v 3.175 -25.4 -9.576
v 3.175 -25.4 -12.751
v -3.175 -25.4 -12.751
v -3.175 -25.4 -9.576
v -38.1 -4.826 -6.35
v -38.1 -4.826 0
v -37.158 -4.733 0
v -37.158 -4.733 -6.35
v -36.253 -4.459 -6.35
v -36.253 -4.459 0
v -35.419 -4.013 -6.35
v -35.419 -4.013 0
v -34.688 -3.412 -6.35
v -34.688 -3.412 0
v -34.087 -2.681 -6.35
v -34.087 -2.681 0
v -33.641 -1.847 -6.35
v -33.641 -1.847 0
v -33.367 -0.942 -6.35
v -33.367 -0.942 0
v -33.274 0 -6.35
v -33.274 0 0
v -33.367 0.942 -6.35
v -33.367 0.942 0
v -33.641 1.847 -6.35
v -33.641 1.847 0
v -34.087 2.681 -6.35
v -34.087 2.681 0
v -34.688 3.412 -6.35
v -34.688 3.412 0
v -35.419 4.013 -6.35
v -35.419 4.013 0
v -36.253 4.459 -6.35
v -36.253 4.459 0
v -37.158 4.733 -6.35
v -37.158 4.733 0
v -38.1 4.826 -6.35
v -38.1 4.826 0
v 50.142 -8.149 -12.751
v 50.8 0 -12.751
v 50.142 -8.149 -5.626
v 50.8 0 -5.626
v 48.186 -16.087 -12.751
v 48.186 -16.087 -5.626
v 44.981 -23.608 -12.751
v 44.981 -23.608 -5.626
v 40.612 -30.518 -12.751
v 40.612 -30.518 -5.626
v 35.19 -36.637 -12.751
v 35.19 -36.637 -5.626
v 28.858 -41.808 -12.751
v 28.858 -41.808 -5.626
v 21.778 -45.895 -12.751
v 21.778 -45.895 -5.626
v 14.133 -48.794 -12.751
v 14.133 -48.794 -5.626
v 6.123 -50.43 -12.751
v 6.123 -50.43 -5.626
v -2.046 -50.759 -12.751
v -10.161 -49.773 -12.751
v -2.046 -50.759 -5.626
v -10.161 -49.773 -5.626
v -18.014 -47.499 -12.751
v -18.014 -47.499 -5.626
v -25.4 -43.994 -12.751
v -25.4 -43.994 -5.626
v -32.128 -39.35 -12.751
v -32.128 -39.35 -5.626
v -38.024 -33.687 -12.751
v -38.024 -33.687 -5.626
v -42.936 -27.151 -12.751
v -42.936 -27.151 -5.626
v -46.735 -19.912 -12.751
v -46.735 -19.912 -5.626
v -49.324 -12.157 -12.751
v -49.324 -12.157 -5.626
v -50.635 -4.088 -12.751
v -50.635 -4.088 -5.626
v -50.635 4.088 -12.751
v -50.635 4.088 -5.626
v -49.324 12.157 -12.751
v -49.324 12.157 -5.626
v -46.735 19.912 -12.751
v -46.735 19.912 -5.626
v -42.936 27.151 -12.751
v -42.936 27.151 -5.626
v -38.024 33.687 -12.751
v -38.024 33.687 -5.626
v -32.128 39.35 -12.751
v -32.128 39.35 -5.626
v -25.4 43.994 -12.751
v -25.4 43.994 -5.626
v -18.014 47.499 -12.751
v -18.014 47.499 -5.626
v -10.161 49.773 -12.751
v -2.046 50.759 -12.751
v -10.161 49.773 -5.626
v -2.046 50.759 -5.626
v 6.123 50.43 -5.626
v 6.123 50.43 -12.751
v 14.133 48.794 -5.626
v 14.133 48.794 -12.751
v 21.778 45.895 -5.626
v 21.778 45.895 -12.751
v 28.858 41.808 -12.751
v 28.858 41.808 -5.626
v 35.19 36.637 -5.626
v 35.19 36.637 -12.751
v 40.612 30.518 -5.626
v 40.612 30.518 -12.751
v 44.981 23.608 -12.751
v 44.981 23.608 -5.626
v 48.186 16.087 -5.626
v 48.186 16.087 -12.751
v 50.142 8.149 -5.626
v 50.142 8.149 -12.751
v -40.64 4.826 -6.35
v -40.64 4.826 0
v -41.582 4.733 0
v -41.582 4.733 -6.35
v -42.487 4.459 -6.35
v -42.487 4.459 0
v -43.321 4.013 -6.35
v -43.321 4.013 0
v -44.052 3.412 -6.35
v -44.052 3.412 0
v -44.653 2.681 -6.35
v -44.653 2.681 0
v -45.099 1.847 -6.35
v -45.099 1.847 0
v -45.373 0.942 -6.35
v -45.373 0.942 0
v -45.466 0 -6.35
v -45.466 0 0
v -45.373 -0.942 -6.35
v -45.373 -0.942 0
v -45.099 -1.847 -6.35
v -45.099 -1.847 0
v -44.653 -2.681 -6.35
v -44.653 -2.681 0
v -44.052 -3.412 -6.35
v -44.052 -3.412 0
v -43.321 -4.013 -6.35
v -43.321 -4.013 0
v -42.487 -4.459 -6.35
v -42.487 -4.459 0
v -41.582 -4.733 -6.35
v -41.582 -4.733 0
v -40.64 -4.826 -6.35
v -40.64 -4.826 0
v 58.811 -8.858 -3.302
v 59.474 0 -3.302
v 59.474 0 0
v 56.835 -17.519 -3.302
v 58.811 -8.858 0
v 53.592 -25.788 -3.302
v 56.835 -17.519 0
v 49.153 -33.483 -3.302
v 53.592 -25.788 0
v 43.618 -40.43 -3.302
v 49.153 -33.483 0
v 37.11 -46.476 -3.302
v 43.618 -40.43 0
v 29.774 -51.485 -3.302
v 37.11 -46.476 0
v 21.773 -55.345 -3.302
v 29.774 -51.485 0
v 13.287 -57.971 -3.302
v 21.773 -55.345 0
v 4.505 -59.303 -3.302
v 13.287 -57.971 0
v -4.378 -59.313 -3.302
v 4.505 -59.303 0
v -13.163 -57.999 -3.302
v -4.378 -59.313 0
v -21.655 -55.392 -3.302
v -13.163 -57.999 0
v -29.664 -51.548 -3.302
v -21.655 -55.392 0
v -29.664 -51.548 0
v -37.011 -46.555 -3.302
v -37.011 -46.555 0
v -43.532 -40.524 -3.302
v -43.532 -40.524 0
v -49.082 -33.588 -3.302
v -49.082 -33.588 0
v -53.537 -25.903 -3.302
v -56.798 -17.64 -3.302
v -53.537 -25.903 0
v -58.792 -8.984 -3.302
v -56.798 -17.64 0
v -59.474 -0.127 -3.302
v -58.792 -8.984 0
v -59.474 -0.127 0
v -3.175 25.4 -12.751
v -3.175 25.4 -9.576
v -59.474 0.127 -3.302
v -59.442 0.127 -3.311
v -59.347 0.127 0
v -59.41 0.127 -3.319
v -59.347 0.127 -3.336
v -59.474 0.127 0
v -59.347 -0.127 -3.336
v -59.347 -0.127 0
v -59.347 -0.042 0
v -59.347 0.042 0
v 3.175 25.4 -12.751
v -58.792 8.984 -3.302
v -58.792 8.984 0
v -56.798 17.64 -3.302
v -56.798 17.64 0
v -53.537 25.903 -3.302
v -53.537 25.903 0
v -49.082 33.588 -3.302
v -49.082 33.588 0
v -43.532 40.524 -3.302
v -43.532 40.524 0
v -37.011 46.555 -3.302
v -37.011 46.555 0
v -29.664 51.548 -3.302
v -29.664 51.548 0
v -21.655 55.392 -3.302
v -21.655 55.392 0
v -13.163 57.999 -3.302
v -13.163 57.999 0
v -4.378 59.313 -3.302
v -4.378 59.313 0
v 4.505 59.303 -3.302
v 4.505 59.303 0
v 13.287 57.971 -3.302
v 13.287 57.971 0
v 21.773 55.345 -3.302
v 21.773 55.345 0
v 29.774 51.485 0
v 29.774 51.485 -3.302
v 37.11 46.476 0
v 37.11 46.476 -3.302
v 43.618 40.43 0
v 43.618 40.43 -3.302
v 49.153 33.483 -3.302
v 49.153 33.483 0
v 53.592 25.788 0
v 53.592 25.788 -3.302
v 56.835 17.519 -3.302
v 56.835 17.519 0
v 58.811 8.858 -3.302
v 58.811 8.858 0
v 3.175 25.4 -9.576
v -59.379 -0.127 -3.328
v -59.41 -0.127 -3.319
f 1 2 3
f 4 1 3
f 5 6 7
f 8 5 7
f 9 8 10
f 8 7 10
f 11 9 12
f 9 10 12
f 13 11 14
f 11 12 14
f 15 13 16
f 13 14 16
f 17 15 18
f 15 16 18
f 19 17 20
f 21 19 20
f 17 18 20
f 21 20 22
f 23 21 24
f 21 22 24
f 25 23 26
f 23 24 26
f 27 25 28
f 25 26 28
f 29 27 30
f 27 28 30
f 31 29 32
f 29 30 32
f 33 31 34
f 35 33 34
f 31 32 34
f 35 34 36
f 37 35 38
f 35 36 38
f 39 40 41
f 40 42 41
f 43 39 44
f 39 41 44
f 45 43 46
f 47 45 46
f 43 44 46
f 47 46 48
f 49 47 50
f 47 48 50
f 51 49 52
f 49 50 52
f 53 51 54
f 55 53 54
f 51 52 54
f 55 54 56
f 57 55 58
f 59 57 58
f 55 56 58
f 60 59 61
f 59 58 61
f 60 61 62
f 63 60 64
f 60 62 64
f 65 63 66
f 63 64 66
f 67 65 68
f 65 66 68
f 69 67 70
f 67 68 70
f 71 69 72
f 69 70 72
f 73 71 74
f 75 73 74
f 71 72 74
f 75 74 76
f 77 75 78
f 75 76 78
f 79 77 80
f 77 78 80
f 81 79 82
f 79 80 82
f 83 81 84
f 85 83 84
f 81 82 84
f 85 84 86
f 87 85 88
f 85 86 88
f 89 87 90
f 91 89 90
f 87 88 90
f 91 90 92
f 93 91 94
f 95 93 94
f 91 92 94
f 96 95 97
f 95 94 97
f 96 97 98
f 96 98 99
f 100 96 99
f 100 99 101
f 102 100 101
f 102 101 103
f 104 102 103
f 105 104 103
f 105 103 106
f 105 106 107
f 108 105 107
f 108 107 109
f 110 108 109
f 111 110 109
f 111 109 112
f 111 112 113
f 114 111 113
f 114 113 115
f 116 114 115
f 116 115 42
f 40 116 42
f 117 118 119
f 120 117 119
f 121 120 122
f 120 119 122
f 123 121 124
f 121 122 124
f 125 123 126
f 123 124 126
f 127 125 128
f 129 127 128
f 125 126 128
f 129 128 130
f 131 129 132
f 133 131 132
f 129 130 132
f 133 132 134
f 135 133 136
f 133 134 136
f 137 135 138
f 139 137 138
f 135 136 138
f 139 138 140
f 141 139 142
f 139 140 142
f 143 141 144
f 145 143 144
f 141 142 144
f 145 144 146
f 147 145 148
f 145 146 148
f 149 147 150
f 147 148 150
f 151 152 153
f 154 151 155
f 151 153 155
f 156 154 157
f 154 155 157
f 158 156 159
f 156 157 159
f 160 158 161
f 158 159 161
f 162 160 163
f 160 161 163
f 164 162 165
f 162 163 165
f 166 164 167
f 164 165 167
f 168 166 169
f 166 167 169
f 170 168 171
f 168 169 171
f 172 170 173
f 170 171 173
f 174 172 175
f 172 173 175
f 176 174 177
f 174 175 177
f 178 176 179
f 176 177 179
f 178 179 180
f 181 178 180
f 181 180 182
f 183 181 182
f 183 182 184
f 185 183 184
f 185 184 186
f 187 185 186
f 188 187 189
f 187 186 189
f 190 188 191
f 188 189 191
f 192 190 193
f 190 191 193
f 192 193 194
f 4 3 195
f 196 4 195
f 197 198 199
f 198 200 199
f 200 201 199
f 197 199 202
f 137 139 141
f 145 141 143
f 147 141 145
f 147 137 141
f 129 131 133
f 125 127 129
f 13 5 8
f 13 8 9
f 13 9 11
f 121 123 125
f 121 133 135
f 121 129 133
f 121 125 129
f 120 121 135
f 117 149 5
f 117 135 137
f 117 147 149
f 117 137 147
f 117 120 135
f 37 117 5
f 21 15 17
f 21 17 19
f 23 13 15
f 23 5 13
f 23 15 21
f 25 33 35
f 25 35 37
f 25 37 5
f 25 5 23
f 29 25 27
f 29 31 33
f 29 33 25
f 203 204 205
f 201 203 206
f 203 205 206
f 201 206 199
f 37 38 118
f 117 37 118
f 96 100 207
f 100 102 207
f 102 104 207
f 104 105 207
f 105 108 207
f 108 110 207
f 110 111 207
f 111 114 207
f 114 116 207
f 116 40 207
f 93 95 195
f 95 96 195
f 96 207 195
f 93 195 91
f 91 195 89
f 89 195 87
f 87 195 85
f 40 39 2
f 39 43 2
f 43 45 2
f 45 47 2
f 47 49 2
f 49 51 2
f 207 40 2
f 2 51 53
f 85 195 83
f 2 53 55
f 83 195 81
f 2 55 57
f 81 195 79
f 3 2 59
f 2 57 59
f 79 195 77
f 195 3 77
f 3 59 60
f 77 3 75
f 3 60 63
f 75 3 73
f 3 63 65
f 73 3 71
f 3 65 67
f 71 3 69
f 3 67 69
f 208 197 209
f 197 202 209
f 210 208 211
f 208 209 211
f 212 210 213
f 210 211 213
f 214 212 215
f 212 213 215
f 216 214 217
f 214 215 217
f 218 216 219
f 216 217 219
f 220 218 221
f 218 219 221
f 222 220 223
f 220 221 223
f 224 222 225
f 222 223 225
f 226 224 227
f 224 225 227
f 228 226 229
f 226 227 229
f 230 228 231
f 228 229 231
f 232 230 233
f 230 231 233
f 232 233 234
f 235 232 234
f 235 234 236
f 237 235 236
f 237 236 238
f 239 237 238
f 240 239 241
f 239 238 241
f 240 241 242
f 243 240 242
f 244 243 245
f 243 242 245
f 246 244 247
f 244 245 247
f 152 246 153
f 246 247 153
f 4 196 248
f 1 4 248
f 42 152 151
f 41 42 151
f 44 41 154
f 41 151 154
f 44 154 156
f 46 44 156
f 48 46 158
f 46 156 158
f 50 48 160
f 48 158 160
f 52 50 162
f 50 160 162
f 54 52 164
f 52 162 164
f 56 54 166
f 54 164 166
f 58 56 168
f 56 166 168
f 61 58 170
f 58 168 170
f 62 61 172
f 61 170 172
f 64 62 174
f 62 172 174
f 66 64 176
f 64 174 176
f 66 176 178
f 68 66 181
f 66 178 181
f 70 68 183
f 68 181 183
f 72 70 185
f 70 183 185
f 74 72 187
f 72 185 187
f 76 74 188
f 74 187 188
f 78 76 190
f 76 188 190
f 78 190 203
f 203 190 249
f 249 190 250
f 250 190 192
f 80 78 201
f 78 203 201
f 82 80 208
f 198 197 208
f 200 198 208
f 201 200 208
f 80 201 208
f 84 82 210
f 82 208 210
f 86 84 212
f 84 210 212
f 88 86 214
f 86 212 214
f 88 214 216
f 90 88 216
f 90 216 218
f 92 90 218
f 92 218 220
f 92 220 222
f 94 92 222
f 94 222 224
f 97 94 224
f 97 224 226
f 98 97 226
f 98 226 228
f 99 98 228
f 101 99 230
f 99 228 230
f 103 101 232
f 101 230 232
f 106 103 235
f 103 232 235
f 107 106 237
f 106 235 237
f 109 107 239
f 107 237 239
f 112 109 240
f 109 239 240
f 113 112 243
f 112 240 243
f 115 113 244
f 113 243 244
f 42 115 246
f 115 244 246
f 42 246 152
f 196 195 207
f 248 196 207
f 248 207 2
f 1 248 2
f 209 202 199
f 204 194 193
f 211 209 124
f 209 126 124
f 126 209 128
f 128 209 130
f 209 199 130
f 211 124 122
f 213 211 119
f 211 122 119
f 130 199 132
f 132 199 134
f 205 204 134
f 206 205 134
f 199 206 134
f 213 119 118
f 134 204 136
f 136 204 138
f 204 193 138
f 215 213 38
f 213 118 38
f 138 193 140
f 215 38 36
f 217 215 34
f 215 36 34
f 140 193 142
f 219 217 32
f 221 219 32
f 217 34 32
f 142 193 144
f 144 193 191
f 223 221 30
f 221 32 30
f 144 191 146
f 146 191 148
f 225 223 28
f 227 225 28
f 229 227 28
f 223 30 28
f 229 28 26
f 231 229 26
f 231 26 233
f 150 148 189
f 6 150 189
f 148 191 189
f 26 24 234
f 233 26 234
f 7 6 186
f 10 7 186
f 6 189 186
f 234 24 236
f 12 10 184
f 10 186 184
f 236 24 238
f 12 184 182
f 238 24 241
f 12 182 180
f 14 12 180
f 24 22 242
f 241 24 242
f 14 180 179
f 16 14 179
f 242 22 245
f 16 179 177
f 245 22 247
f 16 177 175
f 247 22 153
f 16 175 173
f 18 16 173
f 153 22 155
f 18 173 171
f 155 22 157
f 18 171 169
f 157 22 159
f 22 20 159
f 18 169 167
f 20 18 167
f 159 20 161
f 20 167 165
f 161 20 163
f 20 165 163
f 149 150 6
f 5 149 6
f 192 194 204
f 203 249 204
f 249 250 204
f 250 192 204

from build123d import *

# Parameters (mm, degrees)
F3_DEPTH = 6.35
F5_DEPTH = 25.4
F7_DEPTH = 3.175


with BuildPart() as f1:
    # F0 (on Front) → F1 (revolve)
    with BuildSketch(Plane.XZ):
        Polygon((59.4741, 0), (0, 0), (0, -12.7508), (50.8, -12.7508), (50.8, -5.626218), (59.4741, -3.302), align=None)
    revolve(axis=Axis((0, 0, -6.3754), (0, 0, -1)))

    # F2 (on face) → F3 (cut)
    with BuildSketch(Plane.XY):
        with BuildLine():
            Line((-40.64, -4.826), (-38.1, -4.826))
            ThreePointArc((-38.1, -4.826), (-33.274, 0), (-38.1, 4.826))
            Line((-38.1, 4.826), (-40.64, 4.826))
            ThreePointArc((-40.64, 4.826), (-45.466, 0), (-40.64, -4.826))
        make_face()
    extrude(amount=-F3_DEPTH, mode=Mode.SUBTRACT)

    # F4 (on face) → F5 (cut)
    with BuildSketch(Plane.XY):
        with BuildLine():
            ThreePointArc((-59.346964, -0.127), (-59.3471, 0), (-59.346964, 0.127))
            Line((-59.346964, 0.127), (-59.4741, 0.127))
            Line((-59.4741, 0.127), (-59.4741, -0.127))
            Line((-59.4741, -0.127), (-59.346964, -0.127))
        make_face()
    extrude(amount=-F5_DEPTH, mode=Mode.SUBTRACT)

    # F6 (on face) → F7 (cut)
    with BuildSketch(Plane(origin=(0, 0, -12.7508), x_dir=(1, 0, 0), z_dir=(0, 0, -1))):
        Polygon((3.175, -25.4), (3.175, 0), (3.175, 25.4), (-3.175, 25.4), (-3.175, 0), (-3.175, -25.4), align=None)
    extrude(amount=-F7_DEPTH, mode=Mode.SUBTRACT)


solid = f1.part
